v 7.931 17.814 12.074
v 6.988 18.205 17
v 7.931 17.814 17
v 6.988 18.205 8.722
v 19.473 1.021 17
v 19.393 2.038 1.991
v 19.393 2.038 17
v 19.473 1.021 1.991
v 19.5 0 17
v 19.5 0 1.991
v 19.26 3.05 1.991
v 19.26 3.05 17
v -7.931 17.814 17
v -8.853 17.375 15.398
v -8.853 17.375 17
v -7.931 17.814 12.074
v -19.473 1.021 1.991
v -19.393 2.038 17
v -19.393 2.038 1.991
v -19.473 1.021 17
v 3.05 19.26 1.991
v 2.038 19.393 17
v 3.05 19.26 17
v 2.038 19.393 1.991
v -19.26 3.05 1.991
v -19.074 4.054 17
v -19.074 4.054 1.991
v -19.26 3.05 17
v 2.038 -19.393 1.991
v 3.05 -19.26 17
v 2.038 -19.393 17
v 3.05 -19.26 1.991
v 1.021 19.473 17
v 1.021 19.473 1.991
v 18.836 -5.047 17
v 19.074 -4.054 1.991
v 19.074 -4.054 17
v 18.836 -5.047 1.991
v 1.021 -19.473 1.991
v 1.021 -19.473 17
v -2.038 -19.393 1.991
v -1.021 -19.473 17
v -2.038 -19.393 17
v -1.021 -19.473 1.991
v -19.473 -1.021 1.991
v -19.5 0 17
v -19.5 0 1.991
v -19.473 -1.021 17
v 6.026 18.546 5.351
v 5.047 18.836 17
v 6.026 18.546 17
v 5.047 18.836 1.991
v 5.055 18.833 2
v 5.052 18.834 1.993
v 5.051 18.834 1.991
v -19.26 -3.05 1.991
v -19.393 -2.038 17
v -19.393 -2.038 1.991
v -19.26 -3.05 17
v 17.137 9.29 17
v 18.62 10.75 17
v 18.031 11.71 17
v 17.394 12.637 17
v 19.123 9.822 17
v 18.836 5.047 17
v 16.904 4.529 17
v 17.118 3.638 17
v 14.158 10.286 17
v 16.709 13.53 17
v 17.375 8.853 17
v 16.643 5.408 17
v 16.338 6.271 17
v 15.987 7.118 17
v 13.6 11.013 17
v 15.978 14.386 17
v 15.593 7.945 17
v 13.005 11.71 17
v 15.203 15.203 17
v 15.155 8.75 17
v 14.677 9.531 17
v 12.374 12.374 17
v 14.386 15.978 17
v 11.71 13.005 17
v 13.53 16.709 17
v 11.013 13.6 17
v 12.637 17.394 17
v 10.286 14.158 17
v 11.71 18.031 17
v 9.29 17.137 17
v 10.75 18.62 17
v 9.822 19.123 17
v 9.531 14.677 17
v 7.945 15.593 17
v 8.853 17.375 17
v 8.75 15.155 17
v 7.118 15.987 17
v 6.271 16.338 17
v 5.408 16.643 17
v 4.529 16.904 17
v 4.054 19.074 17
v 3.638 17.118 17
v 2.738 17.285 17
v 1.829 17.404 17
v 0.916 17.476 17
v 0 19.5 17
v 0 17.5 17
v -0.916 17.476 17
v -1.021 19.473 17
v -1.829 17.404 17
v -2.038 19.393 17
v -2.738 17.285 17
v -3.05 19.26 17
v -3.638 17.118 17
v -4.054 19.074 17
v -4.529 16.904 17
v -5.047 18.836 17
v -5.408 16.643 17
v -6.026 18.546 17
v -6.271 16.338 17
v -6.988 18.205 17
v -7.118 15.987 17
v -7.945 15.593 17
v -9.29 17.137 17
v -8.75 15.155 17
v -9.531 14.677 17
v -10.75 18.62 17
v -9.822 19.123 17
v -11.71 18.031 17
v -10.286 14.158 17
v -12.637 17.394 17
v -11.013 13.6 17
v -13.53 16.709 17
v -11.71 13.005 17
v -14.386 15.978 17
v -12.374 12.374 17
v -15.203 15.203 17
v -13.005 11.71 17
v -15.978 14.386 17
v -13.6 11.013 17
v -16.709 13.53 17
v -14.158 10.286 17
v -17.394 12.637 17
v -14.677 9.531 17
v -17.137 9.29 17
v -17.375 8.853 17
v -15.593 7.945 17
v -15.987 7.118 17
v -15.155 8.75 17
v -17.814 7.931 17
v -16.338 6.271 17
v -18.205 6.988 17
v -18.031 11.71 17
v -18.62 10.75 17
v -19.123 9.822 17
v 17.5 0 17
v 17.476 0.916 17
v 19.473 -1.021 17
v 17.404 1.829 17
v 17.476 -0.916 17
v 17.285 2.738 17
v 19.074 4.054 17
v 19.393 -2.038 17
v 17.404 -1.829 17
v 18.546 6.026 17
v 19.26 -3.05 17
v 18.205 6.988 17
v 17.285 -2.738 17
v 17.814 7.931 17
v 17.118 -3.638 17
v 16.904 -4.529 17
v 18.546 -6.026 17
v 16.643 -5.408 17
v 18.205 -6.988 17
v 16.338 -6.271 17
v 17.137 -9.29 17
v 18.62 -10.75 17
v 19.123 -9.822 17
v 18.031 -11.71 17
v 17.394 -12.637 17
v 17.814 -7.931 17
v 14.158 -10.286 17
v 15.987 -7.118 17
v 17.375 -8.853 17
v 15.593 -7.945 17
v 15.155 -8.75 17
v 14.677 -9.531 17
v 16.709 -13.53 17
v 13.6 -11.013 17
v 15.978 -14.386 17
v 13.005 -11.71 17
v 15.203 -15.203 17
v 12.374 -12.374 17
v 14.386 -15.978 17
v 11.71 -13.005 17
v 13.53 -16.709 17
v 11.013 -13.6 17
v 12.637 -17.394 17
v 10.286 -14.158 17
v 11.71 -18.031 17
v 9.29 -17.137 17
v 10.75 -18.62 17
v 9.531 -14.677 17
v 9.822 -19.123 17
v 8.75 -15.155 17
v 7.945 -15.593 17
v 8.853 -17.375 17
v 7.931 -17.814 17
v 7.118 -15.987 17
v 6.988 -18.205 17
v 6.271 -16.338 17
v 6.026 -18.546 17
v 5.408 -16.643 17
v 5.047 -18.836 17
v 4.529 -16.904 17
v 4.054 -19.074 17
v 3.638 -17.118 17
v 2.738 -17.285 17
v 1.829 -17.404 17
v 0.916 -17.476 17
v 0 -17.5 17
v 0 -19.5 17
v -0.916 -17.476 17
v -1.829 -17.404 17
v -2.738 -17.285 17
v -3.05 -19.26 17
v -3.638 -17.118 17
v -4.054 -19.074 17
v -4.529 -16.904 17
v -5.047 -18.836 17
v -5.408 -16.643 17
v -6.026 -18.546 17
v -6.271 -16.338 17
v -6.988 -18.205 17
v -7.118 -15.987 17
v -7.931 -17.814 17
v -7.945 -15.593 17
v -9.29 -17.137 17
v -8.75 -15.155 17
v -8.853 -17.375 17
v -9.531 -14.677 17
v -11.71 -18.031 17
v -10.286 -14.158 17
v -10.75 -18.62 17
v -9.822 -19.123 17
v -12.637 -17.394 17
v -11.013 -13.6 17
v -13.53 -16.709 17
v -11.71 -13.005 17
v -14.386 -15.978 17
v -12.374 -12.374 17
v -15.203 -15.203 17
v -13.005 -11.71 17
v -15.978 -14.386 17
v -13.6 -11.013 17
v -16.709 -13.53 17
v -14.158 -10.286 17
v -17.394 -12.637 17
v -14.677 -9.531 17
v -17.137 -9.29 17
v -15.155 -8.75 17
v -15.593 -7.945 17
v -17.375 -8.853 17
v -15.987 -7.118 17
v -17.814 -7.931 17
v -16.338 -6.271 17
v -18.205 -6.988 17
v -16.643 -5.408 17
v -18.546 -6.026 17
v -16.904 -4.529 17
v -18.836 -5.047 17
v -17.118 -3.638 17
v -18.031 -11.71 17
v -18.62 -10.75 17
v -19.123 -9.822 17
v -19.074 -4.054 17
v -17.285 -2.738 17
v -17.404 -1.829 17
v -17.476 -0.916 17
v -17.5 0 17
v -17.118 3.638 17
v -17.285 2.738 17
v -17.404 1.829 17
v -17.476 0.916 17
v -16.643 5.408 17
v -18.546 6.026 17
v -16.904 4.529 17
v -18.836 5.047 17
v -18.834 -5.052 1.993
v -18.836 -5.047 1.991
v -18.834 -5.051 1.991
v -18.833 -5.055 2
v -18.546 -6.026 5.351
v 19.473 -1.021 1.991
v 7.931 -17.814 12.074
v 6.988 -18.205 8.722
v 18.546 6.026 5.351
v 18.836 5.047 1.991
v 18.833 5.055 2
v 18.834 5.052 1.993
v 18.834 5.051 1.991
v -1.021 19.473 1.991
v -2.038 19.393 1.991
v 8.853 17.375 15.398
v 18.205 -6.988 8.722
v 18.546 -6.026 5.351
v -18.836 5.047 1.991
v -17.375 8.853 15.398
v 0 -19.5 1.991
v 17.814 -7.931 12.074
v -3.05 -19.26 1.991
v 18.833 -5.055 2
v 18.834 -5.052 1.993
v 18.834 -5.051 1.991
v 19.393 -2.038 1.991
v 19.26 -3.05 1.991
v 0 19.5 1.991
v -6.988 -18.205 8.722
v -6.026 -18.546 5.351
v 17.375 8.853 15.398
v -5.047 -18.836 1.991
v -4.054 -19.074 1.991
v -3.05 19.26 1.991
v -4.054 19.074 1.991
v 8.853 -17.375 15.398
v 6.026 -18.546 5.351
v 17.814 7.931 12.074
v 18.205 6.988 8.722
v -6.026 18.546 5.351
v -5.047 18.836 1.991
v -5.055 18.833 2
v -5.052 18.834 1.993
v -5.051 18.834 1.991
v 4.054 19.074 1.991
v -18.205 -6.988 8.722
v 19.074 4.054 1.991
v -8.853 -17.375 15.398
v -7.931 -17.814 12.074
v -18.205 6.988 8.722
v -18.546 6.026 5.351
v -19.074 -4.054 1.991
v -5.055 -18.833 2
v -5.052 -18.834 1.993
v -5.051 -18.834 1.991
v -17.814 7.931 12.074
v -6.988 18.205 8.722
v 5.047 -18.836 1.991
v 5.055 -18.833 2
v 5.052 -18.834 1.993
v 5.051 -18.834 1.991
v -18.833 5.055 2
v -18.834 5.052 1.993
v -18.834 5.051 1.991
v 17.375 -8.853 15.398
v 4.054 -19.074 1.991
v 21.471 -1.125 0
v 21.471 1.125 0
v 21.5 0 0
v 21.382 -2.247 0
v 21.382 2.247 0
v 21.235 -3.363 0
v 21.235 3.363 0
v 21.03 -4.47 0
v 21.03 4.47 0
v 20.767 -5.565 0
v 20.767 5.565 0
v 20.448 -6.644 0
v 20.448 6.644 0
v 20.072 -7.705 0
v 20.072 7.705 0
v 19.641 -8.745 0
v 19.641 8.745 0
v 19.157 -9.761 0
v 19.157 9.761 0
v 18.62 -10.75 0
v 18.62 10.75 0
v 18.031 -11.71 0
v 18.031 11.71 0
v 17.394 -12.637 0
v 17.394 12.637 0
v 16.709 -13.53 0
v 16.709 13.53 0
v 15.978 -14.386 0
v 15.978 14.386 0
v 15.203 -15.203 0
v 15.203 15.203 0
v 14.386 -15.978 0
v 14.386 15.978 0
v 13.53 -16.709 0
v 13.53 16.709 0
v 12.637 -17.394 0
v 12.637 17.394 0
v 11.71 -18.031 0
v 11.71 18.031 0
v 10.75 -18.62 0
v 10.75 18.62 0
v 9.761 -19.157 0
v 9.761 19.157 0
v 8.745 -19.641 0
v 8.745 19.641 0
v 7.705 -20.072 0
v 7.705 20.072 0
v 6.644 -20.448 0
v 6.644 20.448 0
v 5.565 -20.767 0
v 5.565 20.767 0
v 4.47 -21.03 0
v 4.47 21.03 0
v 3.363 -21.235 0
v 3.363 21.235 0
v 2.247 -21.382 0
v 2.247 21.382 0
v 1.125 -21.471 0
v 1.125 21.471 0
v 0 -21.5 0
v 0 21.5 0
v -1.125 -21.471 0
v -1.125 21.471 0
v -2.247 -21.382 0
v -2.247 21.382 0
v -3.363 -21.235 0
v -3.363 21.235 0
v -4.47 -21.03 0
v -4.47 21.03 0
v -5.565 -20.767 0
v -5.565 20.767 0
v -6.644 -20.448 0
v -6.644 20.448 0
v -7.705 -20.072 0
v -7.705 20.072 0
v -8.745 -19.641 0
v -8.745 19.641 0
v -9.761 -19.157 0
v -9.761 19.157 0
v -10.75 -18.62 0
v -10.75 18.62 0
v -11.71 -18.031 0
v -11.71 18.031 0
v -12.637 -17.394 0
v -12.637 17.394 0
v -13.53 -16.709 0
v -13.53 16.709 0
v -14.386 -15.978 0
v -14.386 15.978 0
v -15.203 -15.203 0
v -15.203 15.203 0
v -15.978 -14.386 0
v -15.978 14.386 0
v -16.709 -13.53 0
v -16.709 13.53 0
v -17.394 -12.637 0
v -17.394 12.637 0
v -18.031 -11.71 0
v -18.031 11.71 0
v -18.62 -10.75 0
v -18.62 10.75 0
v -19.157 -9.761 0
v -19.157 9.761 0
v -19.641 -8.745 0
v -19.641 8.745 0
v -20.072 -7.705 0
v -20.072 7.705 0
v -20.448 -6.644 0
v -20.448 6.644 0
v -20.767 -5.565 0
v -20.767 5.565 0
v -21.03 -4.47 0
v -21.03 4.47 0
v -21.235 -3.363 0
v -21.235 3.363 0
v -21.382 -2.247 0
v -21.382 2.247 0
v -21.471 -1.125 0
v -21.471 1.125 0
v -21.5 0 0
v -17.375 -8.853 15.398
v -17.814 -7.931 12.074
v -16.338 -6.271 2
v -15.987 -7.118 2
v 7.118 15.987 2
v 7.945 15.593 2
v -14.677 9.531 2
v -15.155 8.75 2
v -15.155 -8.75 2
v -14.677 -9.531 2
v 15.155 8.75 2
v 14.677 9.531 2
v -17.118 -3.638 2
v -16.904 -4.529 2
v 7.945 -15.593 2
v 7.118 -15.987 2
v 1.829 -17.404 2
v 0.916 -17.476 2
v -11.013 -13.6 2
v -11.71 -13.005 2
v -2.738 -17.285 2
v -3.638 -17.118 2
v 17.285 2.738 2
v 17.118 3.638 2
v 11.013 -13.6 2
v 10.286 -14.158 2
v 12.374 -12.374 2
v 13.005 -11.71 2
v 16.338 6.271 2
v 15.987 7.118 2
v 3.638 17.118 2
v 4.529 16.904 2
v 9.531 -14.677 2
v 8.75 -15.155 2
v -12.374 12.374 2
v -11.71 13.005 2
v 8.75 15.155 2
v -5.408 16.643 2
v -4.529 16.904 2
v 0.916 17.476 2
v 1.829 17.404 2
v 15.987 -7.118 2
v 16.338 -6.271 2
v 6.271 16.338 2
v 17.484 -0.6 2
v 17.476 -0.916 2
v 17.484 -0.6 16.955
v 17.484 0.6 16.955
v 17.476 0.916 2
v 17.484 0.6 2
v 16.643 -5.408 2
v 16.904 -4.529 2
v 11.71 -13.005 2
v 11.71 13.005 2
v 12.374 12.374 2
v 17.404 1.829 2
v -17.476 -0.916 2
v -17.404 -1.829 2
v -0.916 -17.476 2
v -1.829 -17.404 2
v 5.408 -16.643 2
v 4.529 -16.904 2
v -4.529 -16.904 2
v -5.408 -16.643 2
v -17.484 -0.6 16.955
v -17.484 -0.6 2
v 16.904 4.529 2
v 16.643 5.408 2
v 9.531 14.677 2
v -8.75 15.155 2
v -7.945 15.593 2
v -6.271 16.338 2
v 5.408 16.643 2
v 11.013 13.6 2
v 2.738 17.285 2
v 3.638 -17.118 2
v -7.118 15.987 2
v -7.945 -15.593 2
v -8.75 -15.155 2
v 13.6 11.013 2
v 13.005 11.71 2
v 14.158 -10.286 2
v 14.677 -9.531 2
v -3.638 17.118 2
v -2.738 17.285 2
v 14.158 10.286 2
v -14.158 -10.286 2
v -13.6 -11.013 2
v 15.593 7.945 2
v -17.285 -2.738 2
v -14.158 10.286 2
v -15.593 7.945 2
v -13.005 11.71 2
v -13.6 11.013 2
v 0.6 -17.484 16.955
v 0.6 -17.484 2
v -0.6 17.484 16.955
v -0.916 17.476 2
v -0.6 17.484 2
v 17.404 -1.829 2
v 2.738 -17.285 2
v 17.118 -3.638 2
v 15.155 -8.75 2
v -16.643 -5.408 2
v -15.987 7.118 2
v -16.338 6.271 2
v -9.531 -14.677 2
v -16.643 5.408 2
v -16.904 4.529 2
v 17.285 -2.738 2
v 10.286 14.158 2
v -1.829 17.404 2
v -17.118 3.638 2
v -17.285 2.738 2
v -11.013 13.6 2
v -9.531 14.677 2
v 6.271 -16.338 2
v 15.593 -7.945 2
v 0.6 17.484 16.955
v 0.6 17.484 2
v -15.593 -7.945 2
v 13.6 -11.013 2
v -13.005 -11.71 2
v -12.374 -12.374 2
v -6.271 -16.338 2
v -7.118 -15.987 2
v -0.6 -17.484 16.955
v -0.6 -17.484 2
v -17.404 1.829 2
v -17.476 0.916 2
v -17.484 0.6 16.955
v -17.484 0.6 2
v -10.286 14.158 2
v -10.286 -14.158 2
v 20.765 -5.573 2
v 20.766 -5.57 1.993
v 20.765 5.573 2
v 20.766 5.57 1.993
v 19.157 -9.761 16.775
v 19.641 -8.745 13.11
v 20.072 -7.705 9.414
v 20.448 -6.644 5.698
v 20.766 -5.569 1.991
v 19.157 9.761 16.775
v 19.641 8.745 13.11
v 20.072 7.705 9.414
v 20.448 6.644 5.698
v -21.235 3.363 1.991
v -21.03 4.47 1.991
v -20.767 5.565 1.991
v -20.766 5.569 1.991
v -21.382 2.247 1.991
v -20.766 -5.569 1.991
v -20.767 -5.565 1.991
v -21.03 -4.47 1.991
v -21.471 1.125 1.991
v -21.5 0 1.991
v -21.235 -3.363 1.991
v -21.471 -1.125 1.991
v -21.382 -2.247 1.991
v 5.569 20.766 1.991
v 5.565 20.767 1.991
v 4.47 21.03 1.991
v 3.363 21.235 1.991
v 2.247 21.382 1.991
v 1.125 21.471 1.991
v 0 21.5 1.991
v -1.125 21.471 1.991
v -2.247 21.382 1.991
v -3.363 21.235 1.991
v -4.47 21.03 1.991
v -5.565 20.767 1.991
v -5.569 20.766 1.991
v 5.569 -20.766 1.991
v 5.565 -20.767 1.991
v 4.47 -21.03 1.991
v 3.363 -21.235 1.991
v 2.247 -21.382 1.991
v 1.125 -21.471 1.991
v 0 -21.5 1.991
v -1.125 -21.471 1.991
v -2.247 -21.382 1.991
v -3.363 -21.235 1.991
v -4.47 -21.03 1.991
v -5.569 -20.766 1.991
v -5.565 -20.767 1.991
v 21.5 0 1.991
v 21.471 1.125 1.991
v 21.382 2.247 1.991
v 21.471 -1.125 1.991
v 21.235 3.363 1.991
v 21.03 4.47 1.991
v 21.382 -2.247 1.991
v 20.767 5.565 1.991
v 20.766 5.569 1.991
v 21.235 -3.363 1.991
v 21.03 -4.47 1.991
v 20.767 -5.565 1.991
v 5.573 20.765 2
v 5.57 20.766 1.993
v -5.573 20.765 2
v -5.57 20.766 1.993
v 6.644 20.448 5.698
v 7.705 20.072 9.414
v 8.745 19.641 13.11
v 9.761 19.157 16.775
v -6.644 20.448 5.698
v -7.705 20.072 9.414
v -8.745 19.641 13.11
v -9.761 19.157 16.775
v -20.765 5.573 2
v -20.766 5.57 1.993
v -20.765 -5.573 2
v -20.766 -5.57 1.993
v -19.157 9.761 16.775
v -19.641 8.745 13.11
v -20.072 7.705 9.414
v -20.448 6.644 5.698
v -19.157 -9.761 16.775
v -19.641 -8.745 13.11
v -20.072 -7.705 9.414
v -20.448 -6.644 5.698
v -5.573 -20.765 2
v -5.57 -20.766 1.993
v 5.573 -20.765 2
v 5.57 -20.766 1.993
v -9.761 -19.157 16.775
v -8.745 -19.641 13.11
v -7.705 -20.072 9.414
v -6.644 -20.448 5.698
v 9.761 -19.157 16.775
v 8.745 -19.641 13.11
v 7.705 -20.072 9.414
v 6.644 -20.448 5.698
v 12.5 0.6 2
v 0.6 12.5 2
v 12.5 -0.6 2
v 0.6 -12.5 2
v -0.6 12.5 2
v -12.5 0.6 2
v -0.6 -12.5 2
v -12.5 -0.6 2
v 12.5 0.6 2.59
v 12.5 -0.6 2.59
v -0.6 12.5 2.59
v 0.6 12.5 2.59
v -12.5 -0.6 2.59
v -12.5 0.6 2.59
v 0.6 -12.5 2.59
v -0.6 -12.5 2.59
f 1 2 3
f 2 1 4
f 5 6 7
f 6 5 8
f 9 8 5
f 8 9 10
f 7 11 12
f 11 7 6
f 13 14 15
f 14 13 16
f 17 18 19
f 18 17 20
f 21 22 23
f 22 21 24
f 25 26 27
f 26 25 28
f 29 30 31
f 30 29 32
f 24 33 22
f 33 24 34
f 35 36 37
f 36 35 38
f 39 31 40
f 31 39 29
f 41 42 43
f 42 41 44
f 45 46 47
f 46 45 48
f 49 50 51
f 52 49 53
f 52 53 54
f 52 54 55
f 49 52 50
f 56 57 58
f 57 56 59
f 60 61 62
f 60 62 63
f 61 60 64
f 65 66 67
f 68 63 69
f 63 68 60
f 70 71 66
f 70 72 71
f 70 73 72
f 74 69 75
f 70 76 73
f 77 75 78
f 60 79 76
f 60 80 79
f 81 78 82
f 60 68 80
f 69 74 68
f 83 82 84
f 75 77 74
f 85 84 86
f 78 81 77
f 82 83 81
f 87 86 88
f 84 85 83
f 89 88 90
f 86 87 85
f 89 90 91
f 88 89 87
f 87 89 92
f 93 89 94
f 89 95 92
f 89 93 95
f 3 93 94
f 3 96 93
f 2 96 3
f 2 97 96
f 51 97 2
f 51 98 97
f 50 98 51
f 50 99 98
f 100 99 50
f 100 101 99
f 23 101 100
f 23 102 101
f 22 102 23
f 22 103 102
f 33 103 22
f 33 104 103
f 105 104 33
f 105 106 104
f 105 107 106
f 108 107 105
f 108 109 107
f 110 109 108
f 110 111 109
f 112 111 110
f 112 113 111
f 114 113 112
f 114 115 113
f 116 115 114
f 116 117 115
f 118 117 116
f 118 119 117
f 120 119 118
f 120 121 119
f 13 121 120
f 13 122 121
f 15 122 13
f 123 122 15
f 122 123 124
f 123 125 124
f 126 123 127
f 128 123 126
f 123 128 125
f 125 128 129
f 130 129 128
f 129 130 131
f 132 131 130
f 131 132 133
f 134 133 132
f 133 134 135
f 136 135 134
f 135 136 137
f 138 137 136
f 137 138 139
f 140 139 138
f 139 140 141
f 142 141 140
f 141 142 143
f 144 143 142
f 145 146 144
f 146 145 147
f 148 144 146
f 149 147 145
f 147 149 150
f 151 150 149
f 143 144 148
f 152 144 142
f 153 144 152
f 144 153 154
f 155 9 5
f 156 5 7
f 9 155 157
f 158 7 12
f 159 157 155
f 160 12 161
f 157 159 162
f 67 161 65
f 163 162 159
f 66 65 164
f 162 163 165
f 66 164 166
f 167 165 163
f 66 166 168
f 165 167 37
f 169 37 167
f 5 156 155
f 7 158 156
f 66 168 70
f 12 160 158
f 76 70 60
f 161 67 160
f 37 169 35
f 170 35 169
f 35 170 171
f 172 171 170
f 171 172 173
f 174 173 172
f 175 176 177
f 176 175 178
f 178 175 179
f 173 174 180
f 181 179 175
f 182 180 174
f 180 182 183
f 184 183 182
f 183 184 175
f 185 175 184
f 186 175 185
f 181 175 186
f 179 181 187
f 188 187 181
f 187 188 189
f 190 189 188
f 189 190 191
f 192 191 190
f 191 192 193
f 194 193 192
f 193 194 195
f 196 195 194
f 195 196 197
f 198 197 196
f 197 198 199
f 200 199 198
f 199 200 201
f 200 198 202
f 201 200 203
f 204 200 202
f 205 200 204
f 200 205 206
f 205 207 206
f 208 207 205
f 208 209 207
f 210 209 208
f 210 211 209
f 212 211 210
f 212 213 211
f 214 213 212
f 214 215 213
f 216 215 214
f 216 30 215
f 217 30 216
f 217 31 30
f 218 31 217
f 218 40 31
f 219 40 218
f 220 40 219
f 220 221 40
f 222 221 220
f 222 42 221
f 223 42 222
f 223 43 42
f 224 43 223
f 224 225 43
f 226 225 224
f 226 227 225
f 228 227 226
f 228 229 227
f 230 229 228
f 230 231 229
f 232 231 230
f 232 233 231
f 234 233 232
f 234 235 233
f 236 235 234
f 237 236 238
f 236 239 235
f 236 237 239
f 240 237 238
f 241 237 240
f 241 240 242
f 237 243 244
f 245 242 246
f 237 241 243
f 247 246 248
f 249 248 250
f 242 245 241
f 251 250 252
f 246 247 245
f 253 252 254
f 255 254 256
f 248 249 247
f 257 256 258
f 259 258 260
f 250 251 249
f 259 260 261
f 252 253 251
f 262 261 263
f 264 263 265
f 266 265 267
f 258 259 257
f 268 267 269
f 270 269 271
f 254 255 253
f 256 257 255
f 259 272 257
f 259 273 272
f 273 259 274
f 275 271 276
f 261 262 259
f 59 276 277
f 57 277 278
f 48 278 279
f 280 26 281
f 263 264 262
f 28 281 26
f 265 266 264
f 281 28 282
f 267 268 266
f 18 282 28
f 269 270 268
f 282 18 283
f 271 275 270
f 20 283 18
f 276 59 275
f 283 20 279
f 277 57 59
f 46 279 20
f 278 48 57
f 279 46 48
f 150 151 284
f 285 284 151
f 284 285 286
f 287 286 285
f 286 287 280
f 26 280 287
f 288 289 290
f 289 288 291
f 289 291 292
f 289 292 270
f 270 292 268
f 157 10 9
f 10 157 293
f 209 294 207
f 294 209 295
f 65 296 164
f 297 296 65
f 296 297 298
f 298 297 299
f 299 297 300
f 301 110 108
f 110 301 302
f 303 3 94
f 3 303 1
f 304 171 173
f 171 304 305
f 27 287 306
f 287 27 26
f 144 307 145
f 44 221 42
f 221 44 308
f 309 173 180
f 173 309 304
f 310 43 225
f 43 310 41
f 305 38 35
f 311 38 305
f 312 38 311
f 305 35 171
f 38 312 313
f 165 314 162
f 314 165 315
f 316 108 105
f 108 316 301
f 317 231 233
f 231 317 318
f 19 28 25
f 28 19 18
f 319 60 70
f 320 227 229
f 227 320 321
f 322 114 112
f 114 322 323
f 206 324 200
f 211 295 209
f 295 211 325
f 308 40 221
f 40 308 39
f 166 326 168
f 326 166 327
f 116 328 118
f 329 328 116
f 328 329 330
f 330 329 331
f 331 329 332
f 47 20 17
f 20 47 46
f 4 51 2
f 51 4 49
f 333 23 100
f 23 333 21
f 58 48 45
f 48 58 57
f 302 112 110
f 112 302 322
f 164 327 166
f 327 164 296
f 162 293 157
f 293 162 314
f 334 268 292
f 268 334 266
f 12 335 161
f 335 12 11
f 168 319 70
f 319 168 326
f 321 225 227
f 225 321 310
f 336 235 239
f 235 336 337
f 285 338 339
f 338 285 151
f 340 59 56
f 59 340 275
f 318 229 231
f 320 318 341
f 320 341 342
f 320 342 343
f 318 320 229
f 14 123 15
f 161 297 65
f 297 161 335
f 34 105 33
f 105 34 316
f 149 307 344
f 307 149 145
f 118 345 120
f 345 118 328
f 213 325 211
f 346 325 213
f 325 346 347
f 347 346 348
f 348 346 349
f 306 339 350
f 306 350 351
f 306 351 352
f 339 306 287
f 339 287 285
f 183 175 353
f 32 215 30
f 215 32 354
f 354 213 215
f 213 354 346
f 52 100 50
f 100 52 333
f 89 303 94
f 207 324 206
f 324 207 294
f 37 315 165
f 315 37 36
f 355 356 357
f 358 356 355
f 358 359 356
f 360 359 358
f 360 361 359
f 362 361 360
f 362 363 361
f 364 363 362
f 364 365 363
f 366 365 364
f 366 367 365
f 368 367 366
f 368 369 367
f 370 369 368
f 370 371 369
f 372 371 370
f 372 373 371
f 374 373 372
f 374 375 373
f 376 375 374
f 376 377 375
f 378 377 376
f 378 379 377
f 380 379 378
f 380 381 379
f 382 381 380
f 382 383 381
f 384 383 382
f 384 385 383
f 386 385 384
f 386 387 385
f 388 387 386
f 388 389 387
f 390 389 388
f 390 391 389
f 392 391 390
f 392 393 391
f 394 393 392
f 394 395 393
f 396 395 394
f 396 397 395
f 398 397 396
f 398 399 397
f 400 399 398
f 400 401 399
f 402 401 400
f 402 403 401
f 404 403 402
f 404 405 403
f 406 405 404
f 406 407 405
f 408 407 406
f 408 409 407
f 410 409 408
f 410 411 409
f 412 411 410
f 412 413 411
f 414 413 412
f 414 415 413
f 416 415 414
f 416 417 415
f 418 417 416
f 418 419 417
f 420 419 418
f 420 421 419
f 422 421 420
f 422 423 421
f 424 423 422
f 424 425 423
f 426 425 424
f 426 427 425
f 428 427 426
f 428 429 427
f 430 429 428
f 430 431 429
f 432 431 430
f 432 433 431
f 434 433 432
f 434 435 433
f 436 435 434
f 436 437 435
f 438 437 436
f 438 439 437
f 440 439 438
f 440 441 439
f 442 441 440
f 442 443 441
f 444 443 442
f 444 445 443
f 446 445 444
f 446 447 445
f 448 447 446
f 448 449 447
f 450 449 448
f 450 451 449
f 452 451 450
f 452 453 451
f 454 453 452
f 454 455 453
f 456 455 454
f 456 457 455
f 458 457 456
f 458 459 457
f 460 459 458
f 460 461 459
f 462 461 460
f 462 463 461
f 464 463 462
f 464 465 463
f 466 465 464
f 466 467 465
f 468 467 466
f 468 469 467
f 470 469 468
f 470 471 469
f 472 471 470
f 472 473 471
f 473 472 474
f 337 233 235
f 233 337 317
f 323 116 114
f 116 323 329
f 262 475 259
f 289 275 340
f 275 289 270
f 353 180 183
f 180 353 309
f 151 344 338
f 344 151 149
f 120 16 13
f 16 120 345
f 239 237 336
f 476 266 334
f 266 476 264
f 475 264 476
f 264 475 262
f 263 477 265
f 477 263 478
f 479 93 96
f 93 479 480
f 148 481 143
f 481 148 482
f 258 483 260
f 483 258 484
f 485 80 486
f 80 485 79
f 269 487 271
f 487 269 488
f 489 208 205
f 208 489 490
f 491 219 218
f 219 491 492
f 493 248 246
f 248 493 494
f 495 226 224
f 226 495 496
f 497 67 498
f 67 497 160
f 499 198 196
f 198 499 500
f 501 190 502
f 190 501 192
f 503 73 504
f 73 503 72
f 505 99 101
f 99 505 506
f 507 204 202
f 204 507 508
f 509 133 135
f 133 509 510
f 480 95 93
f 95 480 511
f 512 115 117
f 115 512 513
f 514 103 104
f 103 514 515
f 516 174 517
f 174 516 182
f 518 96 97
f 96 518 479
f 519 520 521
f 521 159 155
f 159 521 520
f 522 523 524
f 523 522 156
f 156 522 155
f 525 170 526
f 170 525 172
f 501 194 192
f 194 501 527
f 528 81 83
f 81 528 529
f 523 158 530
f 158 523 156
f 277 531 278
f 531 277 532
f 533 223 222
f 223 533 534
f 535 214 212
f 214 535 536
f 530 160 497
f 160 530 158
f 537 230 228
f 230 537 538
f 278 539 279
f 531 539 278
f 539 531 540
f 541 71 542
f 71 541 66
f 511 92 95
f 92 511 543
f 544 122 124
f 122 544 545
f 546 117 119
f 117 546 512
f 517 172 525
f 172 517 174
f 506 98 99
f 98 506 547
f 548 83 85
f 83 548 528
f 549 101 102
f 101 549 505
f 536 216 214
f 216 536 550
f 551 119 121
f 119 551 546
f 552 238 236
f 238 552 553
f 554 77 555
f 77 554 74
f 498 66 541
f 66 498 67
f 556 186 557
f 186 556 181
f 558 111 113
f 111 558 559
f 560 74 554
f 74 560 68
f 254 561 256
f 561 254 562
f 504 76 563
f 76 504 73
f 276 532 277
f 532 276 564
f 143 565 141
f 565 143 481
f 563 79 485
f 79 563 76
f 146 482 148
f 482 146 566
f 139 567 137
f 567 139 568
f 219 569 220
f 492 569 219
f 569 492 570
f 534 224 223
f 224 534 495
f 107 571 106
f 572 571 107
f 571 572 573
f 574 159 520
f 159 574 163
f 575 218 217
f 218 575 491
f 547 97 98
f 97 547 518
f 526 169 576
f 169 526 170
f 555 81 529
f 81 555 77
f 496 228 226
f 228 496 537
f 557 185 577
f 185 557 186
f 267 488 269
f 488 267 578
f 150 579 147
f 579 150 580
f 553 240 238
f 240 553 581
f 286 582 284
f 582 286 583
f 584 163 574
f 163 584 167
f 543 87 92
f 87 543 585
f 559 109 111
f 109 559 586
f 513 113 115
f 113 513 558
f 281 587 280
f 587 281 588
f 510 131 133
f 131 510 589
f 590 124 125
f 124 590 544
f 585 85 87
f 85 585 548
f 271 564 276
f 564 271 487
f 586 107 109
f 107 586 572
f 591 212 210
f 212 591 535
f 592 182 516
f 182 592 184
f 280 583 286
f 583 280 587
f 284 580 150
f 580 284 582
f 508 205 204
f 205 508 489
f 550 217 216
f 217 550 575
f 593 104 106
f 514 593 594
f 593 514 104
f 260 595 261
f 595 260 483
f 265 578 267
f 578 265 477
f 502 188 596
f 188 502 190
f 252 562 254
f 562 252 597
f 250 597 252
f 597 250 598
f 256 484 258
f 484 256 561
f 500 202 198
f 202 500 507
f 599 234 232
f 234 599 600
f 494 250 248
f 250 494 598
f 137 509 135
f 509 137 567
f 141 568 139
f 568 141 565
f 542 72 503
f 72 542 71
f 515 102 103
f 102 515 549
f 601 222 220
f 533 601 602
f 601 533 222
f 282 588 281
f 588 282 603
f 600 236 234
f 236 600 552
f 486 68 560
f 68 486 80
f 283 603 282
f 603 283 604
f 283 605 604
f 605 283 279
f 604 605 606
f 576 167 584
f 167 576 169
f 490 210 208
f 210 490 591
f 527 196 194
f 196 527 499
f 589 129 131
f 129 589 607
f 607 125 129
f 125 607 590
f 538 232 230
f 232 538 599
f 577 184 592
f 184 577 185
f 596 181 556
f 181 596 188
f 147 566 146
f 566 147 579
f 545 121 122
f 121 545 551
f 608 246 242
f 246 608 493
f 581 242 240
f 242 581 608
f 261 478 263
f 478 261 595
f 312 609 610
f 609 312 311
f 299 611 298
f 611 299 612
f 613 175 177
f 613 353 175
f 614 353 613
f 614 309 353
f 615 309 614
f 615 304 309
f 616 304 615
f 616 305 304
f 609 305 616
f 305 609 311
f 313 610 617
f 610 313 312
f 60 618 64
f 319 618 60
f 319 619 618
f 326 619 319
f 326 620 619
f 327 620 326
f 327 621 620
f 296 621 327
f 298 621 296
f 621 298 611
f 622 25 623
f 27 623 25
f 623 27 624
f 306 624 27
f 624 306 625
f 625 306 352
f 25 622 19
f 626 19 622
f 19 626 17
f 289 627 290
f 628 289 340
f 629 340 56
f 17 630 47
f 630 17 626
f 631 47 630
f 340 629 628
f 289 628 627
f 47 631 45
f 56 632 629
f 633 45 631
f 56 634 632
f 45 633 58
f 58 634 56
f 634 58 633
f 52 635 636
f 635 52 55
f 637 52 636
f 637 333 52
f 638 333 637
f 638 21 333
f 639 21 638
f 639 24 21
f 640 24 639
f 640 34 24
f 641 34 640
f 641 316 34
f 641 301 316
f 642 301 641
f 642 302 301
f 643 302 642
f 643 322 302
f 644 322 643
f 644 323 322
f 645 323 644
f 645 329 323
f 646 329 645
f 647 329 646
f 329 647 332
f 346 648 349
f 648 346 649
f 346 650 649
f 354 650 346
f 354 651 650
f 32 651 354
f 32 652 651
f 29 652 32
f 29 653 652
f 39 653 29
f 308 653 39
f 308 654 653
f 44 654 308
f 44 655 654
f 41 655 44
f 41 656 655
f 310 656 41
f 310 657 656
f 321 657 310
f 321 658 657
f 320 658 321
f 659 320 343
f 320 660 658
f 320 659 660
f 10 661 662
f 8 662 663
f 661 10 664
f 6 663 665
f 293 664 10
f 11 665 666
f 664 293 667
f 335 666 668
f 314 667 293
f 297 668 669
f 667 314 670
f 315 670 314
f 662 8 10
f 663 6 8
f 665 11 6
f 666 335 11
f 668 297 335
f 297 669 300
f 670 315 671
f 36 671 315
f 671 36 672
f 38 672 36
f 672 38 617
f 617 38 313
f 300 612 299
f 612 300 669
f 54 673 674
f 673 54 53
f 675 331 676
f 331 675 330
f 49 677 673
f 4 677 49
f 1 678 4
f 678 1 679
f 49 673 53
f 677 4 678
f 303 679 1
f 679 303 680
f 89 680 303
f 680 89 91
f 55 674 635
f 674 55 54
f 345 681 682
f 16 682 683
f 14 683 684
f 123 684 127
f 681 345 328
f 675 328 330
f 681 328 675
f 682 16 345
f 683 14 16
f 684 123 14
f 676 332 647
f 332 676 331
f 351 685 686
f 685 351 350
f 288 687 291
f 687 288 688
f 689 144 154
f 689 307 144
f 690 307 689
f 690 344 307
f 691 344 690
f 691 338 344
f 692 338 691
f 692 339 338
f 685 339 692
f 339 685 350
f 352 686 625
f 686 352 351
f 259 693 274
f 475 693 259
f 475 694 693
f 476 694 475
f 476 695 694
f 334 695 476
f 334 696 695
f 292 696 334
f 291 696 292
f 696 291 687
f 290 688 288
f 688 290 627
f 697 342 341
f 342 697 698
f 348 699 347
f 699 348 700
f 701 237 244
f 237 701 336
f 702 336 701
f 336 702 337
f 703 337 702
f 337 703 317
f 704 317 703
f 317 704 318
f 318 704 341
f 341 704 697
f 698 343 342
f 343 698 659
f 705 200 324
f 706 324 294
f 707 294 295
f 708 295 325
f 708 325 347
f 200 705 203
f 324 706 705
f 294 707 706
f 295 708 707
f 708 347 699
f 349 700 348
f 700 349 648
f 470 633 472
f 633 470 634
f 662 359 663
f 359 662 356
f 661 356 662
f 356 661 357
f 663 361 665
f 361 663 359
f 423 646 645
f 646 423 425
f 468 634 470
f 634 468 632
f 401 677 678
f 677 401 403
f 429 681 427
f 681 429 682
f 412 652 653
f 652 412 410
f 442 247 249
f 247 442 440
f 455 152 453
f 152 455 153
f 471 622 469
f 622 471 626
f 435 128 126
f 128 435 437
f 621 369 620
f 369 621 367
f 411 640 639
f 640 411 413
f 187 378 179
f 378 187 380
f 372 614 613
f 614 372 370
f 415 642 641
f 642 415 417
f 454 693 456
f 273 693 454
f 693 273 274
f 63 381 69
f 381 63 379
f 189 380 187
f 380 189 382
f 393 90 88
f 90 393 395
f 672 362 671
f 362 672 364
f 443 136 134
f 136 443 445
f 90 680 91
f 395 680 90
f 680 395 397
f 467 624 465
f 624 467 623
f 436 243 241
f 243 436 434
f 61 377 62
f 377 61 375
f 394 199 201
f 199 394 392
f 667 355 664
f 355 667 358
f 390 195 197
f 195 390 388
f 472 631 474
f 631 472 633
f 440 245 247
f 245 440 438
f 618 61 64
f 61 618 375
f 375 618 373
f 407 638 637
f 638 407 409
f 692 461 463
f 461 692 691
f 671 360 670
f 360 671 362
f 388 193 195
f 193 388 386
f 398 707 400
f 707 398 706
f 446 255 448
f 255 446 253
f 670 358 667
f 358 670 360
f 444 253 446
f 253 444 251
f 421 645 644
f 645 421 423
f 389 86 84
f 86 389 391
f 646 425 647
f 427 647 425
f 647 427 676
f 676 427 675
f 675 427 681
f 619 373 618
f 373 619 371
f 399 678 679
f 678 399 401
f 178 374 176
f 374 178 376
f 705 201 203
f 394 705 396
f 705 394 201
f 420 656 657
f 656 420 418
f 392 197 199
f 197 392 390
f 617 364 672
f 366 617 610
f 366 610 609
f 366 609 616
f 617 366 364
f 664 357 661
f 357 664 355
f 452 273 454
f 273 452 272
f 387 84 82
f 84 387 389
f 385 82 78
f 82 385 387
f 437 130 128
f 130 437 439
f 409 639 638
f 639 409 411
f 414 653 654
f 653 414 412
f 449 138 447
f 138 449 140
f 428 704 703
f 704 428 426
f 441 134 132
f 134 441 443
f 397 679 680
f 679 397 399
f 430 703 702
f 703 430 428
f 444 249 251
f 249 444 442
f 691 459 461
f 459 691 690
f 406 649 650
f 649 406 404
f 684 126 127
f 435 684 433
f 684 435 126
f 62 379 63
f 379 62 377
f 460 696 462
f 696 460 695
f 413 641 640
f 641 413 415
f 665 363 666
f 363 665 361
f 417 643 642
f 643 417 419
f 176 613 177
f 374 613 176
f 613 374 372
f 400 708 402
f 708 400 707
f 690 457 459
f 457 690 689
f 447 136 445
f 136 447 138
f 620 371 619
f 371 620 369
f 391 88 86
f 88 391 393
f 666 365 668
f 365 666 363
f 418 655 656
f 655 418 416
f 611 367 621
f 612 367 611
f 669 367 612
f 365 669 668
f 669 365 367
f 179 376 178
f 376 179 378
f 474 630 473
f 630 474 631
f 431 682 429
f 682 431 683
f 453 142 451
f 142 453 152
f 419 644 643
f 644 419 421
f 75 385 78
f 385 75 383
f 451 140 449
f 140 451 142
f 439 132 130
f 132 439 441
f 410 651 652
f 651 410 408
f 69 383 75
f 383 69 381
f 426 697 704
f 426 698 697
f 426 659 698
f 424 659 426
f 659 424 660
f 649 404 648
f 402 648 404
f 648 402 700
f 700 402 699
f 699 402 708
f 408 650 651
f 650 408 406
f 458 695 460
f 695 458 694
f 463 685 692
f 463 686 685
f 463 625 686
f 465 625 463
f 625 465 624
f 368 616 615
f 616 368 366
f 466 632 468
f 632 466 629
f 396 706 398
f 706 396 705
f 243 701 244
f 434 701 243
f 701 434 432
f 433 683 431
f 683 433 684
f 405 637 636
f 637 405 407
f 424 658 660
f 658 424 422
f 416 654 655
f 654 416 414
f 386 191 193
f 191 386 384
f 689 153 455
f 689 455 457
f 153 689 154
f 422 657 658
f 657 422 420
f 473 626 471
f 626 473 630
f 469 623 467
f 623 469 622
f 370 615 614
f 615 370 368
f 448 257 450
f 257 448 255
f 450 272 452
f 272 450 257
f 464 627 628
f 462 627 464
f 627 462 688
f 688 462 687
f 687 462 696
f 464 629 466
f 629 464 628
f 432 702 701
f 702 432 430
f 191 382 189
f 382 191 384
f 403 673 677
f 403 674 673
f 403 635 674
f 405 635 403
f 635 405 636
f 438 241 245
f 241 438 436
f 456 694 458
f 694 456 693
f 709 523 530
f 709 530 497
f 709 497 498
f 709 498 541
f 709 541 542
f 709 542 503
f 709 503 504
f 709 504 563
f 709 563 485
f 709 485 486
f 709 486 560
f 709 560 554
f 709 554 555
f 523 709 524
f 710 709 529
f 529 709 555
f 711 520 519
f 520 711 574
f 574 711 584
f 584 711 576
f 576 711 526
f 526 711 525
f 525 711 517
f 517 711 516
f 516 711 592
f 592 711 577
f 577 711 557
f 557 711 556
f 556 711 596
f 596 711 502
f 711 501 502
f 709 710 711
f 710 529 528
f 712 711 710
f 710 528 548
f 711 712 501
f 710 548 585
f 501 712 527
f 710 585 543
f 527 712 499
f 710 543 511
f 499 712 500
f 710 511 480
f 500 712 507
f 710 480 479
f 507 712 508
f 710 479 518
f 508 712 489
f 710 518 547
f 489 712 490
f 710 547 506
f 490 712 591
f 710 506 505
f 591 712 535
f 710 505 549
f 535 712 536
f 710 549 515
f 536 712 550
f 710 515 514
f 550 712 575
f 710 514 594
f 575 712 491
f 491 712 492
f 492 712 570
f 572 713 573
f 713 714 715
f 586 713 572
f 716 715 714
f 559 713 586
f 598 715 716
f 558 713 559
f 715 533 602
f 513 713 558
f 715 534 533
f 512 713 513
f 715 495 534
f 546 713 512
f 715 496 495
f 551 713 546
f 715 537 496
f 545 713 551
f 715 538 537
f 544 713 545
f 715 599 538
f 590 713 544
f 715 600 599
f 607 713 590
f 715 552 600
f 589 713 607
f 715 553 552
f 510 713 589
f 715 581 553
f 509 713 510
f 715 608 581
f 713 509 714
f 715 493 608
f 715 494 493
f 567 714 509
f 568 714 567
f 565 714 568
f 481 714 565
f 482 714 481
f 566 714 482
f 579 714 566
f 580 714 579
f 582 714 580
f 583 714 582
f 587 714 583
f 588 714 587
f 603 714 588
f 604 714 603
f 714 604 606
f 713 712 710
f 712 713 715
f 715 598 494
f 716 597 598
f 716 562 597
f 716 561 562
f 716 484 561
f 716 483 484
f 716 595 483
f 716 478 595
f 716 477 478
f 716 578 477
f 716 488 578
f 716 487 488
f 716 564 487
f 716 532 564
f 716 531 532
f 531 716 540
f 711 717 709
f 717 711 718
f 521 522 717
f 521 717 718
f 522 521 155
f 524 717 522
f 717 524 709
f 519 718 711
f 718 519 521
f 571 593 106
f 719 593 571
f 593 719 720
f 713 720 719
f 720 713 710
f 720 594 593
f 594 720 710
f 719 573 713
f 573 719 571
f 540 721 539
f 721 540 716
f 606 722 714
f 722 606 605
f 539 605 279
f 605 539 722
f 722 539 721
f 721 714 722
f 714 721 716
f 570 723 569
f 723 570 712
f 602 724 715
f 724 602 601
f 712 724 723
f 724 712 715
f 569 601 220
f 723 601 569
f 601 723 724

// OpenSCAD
// file: shave.scad
// Shave stick holder common code

// Copyright (C) 2023 Embecosm Limited (www.embecosm.com)

// Contributor: Jeremy Bennett <jeremy.bennett@embecosm.com>

// This file is licensed under the Creative Commons Attribution-ShareAlike 3.0
// Unported License. To view a copy of this license, visit
// http://creativecommons.org/licenses/by-sa/3.0/ or send a letter to Creative
// Commons, PO Box 1866, Mountain View, CA 94042, USA.

// A simple holder with cover for Arko shaving soap sticks.  These soap sticks
// are approximately 82mm long and 33mm in diameter.

// Code common to all components

EPS = 0.01;			// Very small value
INF = 100.0;			// Very large value

STICK_D = 35.0;			// Shave stick diameter
STICK_L = 82.0;			// Shave stick length

WALL = 2.0;			// Thickness of the main wall
OUTER_D1 = STICK_D + WALL * 2.0;
OUTER_D2 = OUTER_D1 + WALL * 2.0;

BASE_THICK = 2.0;		// Thickness of base
BASE_H = 15.0;			// Depth of base
BASE_FLANGE_H = 7.0;		// Height of bottom flange
//CAP_H = 85.0;			// Height of cap excl. cap
CAP_H = 25.0;
CAP_THICK = 1.5;		// Thickness of lid

FIN_THICK = 1.2;		// Thickness of a fin
FIN_W = 5.0;			// Maximum width of a fin

SPACE = 0.10;			// Space for overlap

// Derived
STICK_R = STICK_D / 2.0;
OUTER_R1 = OUTER_D1 / 2.0;
OUTER_R2 = OUTER_D2 / 2.0;

// Reflect -1 is the slice pointing up, +1 is the slice pointing down
module slice (reflect = 1.0) {
     difference () {
	  hull () {
	       ang = atan (BASE_H / STICK_R);
	       translate (v = [0, 0, 0])
		    sphere(r = EPS);
	       rotate (a = [0, 0, -22.5 - reflect * 7.5])
		    translate (v = [INF, 0, 0])
		    sphere (r = EPS);
	       rotate (a = [0, 0, 22.5 + reflect *  7.5])
		    translate (v = [INF, 0, 0])
		    sphere (r = EPS);
	       rotate (a = [0, reflect * ang, -22.5 + reflect * 7.5])
		    translate (v = [INF, 0, 0])
		    sphere (r = EPS);
	       rotate (a = [0, reflect * ang, 22.5 - reflect * 7.5])
		    translate (v = [INF, 0, 0])
		    sphere (r = EPS);
	  };
	  translate (v = [0, 0, -reflect * (BASE_H + EPS + INF / 2)])
	       cube (size = [INF * 2.0, INF * 2.0, INF], center = true);
     }
}

module cutout () {
     union () {
	  slice (-1);
	  rotate (a = [0, 0, 90])
	       slice (-1);
	  rotate (a = [0, 0, 180])
	       slice (-1);
	  rotate (a = [0, 0, 270])
	       slice (-1);
     }
}
// main file
// Shave stick holder base

// Copyright (C) 2023 Embecosm Limited (www.embecosm.com)

// Contributor: Jeremy Bennett <jeremy.bennett@embecosm.com>

// This file is licensed under the Creative Commons Attribution-ShareAlike 3.0
// Unported License. To view a copy of this license, visit
// http://creativecommons.org/licenses/by-sa/3.0/ or send a letter to Creative
// Commons, PO Box 1866, Mountain View, CA 94042, USA.

// A simple holder with cover for Arko shaving soap sticks.  These soap sticks
// are approximately 82mm long and 33mm in diameter.

// Common definitions
include <shave.scad>


module base_rim () {
     difference () {
	  cylinder (r = OUTER_R1, h = BASE_THICK + BASE_H,
		    center = false, $fn = 120);
	  cylinder (r = STICK_R, h = BASE_THICK + BASE_H + EPS,
		    center = false, $fn = 120);
     };
}

module base_bottom () {
     cylinder (r = OUTER_R1, h = BASE_THICK,
	       center = false, $fn = 120);
}

module base_flange () {
     difference () {
	  difference () {
	       cylinder (r = OUTER_R2, h = BASE_THICK + BASE_H,
			 center = false, $fn = 120);
	       translate (v = [0, 0, BASE_THICK])
		    cutout ();
	  };
	  cylinder (r = STICK_R + EPS, h = BASE_THICK + BASE_H + EPS,
		    center = false, $fn = 120);
     }
}

module base () {
     base_rim ();
     base_bottom ();
     base_flange ();
}

module fin () {
     hull () {
	  translate (v = [STICK_R + FIN_THICK / 2.0 - FIN_W, 0.0, BASE_THICK - EPS])
	       cube (size = [FIN_THICK, FIN_THICK, FIN_THICK], center = true);
	  translate (v = [STICK_R + FIN_THICK / 2.0, 0.0, BASE_THICK + BASE_H - FIN_THICK / 2.0])
	       cube (size = [FIN_THICK, FIN_THICK, FIN_THICK], center = true);
	  translate (v = [STICK_R + FIN_THICK / 2.0, 0.0, BASE_THICK + EPS])
	       cube (size = [FIN_THICK, FIN_THICK, FIN_THICK], center = true);
     }
}

module base_complete () {
     base ();
     fin ();
     rotate (a = [0.0, 0.0, 90.0])
	  fin ();
     rotate (a = [0.0, 0.0, 180.0])
	  fin ();
     rotate (a = [0.0, 0.0, 270.0])
	  fin ();
}

base_complete ();
